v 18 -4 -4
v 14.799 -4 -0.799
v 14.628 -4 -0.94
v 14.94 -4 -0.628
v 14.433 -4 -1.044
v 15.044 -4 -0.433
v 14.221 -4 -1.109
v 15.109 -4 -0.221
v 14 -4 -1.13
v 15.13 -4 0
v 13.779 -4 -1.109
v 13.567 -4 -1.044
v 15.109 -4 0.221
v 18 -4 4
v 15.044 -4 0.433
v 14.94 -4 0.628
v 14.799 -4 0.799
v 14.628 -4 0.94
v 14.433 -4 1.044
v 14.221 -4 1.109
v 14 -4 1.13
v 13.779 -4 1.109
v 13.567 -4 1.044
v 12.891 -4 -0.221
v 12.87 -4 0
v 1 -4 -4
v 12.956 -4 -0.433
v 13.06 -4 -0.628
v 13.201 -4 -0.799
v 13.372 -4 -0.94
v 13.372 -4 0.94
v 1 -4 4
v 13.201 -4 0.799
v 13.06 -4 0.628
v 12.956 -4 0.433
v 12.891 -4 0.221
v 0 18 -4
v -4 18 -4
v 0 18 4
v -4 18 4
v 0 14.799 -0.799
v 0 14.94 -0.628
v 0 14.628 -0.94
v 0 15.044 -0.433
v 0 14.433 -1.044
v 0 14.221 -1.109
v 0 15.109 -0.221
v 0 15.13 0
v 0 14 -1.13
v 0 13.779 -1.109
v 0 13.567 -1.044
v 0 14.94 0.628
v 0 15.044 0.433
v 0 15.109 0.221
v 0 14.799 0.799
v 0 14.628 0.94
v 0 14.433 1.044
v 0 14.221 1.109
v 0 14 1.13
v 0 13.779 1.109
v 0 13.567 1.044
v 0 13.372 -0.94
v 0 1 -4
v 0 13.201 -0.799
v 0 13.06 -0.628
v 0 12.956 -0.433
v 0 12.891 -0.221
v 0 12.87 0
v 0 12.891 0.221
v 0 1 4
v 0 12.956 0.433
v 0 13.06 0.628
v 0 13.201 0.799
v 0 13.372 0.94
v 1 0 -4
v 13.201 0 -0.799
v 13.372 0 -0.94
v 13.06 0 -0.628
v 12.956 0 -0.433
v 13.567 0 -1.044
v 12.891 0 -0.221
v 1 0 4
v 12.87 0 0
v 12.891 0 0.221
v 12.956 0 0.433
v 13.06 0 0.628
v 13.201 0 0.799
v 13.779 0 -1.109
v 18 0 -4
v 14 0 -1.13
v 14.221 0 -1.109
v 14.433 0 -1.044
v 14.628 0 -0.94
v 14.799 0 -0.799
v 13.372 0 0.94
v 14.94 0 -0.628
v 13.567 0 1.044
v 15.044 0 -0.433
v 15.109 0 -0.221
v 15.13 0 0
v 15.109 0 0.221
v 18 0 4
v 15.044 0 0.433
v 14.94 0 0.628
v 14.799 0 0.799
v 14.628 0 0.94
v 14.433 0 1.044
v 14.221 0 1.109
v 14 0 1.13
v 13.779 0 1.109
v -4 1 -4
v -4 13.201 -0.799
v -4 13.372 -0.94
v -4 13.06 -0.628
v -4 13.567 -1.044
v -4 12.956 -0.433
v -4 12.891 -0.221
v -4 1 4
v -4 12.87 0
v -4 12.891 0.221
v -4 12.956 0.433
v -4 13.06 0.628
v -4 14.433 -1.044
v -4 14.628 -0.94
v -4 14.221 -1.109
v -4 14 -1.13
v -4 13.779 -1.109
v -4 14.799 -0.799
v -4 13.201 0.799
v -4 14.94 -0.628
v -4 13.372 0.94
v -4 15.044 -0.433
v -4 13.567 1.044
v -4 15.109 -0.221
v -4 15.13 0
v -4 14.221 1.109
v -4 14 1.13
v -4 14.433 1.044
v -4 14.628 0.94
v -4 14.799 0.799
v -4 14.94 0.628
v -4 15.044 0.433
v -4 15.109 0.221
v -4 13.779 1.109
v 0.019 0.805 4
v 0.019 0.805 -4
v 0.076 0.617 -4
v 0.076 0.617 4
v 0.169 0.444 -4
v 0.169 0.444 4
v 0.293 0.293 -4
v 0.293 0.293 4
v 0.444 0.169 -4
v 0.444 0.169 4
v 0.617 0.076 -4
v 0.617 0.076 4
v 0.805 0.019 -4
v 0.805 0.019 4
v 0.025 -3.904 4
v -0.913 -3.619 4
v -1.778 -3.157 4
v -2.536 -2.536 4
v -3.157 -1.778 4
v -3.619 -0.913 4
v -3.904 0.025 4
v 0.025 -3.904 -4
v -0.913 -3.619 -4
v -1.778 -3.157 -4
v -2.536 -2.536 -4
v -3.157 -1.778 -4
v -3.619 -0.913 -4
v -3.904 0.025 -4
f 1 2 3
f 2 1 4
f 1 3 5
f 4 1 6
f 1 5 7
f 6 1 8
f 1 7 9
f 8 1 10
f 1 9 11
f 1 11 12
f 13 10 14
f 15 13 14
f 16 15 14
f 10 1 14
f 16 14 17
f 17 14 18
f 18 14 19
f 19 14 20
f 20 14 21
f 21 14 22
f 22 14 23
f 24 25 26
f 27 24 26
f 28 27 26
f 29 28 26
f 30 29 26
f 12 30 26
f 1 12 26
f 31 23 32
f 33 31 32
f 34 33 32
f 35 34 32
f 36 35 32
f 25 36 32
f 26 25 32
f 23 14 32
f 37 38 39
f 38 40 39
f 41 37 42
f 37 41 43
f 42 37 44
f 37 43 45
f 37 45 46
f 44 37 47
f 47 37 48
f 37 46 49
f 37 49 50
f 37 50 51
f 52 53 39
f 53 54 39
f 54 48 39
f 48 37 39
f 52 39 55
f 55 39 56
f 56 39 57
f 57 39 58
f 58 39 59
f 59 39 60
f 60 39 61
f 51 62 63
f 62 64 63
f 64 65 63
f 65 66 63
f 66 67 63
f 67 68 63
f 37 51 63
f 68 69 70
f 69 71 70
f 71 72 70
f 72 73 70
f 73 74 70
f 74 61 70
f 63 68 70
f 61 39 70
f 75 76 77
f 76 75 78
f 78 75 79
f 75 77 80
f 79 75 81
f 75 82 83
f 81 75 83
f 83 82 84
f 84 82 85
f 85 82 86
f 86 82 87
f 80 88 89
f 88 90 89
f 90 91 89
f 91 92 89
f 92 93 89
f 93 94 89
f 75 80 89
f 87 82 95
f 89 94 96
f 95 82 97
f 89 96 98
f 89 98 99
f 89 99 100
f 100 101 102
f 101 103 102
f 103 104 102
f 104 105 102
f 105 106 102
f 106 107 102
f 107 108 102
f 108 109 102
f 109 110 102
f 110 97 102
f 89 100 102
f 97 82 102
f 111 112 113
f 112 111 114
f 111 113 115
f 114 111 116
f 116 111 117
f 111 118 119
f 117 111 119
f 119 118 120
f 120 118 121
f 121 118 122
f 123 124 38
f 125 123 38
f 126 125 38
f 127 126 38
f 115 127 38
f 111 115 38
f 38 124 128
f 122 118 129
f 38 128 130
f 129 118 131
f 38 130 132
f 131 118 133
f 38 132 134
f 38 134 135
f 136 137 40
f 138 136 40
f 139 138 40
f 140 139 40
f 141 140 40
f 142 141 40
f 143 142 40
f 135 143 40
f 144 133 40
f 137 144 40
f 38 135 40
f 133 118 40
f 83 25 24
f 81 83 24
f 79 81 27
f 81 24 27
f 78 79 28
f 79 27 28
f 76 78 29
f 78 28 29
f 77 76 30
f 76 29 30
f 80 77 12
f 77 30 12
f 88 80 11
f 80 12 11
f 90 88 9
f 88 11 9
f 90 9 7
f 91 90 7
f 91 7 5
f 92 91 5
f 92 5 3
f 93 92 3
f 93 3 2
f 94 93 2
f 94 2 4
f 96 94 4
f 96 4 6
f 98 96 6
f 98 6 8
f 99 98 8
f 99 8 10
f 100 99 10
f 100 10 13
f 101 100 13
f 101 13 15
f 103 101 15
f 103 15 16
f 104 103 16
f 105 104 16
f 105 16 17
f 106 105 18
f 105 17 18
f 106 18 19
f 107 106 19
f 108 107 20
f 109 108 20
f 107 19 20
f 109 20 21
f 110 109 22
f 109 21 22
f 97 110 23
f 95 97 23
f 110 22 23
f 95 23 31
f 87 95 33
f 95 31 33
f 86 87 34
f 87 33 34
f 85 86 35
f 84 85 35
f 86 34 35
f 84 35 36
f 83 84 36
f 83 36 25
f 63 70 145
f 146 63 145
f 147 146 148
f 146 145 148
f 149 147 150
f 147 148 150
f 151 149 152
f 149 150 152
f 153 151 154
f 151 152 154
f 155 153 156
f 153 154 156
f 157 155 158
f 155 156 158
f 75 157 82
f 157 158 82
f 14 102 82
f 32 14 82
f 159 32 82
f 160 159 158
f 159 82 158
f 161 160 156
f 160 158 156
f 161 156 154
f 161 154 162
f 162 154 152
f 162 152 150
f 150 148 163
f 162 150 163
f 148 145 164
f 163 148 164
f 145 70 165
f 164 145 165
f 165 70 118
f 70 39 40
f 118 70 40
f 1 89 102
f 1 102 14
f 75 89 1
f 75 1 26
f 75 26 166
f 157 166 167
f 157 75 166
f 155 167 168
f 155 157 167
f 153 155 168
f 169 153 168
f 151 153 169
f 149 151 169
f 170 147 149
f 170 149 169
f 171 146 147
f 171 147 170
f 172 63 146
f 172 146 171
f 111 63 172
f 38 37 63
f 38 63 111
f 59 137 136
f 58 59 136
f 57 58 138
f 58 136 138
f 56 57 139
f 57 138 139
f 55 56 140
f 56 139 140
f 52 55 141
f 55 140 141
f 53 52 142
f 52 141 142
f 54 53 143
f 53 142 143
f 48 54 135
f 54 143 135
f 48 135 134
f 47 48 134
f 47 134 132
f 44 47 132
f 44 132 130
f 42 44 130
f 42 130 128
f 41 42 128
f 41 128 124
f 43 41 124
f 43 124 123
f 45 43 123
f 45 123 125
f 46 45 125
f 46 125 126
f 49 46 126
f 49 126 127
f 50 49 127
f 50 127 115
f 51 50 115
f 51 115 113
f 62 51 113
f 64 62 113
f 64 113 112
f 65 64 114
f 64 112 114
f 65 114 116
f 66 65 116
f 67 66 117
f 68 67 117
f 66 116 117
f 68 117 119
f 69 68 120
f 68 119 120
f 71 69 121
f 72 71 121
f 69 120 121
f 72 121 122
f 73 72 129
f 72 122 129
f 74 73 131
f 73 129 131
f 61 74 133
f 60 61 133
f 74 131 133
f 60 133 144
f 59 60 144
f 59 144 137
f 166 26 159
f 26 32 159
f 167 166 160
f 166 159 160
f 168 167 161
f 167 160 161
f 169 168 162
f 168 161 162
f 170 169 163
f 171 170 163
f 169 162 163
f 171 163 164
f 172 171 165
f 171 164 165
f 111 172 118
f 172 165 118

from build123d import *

# Parameters (mm, degrees)
BOSS_EXTRUDE1_DEPTH       = 4
F_4_40_TAPPED_HOLE1_D     = 2.2606
F_4_40_TAPPED_HOLE1_DEPTH = 7.6
F_4_40_TAPPED_HOLE1_TIP   = 0.679152758
F_4_40_TAPPED_HOLE2_D     = 2.2606
F_4_40_TAPPED_HOLE2_DEPTH = 7.6
F_4_40_TAPPED_HOLE2_TIP   = 0.679152758


with BuildPart() as part:
    # Sketch3 → Boss-Extrude1 (new, symmetric)
    with BuildSketch(Plane.XY):
        with BuildLine():
            Line((1, 0), (18, 0))
            Line((18, 0), (18, -4))
            Line((18, -4), (1, -4))
            ThreePointArc((1, -4), (-2.535533906, -2.535533906), (-4, 1))
            Line((-4, 1), (-4, 18))
            Line((-4, 18), (0, 18))
            Line((0, 18), (0, 1))
            ThreePointArc((0, 1), (0.292893219, 0.292893219), (1, 0))
        make_face()
    extrude(amount=BOSS_EXTRUDE1_DEPTH, both=True)

    # #4-40 Tapped Hole1
    with Locations(Plane(origin=(0, 0, 0), x_dir=(0, 0, -1), z_dir=(1, 0, 0))):
        with Locations((0, 14)):
            Hole(F_4_40_TAPPED_HOLE1_D / 2, depth=F_4_40_TAPPED_HOLE1_DEPTH)
            with Locations((0, 0, -(F_4_40_TAPPED_HOLE1_DEPTH + F_4_40_TAPPED_HOLE1_TIP / 2))):  # 118° drill point
                Cone(0, F_4_40_TAPPED_HOLE1_D / 2, F_4_40_TAPPED_HOLE1_TIP, mode=Mode.SUBTRACT)

    # #4-40 Tapped Hole2
    with Locations(Plane(origin=(0, 0, 0), x_dir=(1, 0, 0), z_dir=(0, 1, 0))):
        with Locations((14, 0)):
            Hole(F_4_40_TAPPED_HOLE2_D / 2, depth=F_4_40_TAPPED_HOLE2_DEPTH)
            with Locations((0, 0, -(F_4_40_TAPPED_HOLE2_DEPTH + F_4_40_TAPPED_HOLE2_TIP / 2))):  # 118° drill point
                Cone(0, F_4_40_TAPPED_HOLE2_D / 2, F_4_40_TAPPED_HOLE2_TIP, mode=Mode.SUBTRACT)


solid = part.part
